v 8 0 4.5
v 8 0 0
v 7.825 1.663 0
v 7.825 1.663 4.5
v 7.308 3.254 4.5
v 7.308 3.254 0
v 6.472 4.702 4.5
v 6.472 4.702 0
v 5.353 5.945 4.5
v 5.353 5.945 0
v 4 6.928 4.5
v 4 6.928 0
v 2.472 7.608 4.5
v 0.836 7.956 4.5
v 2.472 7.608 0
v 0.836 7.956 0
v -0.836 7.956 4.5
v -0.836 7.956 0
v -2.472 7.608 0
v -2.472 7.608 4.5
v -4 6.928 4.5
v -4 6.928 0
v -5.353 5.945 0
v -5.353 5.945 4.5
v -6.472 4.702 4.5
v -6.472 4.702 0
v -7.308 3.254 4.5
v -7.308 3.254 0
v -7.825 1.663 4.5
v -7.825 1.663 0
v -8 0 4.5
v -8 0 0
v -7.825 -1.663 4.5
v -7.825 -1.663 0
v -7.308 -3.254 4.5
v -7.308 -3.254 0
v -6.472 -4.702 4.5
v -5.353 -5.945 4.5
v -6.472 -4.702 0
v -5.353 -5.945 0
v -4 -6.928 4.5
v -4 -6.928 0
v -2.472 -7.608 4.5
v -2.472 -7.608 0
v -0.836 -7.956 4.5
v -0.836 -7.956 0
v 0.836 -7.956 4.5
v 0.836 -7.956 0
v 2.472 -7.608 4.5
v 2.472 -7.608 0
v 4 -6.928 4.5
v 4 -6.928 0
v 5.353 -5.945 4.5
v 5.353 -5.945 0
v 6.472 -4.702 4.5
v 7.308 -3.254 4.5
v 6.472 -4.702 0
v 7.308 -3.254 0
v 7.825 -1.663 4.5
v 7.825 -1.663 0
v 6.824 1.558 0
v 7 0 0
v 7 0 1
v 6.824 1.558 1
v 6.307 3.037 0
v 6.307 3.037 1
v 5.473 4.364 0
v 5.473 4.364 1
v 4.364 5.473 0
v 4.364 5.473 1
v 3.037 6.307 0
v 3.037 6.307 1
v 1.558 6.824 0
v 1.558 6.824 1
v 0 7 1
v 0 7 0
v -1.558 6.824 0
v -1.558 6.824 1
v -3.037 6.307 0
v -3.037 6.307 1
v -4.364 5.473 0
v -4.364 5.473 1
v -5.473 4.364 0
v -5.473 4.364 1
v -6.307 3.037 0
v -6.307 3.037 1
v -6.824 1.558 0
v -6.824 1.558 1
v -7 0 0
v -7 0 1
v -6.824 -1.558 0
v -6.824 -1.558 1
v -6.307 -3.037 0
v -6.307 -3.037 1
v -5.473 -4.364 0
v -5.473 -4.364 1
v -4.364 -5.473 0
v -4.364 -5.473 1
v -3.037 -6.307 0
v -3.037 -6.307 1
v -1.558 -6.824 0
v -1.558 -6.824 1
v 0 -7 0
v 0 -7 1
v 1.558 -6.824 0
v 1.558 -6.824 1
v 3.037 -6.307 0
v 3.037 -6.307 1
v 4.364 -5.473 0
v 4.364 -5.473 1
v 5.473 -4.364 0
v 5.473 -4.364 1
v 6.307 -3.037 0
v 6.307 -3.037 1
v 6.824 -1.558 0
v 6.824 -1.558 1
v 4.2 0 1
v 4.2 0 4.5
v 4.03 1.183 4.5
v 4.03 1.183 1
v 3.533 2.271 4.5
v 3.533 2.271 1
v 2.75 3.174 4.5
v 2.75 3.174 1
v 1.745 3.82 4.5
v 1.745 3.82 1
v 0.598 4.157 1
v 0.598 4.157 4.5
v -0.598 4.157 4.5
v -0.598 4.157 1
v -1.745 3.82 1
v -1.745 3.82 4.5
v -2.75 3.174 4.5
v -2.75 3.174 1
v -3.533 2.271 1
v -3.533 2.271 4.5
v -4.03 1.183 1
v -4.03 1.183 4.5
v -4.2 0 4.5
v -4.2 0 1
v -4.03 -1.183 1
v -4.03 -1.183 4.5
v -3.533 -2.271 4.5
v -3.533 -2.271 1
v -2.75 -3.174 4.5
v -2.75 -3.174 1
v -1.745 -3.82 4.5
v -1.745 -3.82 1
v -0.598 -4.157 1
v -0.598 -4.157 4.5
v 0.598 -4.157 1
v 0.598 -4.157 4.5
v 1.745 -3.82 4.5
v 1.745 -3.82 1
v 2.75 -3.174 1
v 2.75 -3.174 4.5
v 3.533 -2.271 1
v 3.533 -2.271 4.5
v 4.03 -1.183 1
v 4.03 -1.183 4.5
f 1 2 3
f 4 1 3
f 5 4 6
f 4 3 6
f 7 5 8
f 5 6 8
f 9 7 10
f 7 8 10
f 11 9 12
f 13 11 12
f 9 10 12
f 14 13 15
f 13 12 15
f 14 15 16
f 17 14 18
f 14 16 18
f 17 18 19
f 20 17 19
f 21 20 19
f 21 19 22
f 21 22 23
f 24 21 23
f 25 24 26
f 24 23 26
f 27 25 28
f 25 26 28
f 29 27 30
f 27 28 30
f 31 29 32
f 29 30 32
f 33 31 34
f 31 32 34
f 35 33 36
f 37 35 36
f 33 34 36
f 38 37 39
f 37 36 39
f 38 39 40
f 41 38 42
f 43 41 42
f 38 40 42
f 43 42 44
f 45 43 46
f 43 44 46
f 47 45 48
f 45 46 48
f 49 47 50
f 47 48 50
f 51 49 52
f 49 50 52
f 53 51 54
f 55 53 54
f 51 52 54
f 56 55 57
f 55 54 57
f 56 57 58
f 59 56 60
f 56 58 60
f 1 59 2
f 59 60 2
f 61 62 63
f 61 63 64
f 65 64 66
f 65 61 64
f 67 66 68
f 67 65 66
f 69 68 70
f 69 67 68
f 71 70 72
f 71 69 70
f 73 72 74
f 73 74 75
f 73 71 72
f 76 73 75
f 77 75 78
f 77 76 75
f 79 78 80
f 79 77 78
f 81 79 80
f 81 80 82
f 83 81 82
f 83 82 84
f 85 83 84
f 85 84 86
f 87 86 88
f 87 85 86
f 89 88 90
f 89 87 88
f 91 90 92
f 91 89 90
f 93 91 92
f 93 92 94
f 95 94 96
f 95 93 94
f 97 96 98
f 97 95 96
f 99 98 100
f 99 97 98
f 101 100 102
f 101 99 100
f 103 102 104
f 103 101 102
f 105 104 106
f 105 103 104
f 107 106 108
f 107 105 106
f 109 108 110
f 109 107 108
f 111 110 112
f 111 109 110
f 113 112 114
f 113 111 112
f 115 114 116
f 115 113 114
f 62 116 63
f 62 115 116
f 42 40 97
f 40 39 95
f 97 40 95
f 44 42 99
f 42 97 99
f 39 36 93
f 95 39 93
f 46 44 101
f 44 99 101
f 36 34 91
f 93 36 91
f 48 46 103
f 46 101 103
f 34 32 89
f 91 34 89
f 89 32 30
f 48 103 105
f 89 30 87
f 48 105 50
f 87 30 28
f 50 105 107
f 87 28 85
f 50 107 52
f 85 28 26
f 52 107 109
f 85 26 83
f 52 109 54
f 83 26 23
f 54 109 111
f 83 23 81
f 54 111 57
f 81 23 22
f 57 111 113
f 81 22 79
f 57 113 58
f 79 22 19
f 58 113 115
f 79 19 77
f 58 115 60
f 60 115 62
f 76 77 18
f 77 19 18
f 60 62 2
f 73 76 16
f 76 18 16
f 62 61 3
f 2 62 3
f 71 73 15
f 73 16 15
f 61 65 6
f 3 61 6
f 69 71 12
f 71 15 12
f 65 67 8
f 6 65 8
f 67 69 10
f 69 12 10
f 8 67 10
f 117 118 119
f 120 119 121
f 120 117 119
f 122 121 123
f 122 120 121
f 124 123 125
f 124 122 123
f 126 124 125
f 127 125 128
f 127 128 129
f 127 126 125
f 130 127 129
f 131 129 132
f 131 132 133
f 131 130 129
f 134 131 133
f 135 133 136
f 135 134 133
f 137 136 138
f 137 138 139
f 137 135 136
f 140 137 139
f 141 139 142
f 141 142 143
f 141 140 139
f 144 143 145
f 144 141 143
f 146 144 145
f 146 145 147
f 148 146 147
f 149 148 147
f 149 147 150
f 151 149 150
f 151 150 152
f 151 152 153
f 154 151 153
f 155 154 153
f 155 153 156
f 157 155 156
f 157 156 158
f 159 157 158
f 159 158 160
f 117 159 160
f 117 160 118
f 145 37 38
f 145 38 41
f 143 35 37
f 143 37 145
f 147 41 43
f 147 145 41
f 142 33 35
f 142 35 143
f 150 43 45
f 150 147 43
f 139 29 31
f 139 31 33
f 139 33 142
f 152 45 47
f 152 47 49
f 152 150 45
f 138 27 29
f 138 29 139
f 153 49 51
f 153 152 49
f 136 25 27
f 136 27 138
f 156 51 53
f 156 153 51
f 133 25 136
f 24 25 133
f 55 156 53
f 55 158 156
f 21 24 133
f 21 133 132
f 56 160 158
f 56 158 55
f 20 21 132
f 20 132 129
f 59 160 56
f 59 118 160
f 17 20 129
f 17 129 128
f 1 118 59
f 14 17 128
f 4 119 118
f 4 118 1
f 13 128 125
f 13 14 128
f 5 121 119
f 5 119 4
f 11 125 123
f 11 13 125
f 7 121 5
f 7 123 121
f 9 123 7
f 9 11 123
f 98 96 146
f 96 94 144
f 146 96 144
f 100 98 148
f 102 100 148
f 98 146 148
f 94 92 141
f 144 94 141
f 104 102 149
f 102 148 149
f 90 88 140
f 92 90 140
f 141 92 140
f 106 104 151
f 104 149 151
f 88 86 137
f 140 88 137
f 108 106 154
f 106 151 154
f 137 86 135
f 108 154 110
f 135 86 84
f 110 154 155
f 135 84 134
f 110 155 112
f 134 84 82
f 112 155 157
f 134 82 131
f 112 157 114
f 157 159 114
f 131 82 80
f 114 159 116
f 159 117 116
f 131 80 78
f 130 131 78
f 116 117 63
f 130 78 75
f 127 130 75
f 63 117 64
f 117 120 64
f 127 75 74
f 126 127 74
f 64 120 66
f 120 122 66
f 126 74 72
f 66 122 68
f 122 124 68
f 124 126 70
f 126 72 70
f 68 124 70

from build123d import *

# Parameters (mm, degrees)
CYLINDER014005899_R     = 7
CYLINDER014005899_DEPTH = 1
TUBE005_R               = 8
TUBE005_R_2             = 4.2
TUBE005_DEPTH           = 4.5


with BuildPart() as v_lec809:
    # Cylinder014005899 → Cylinder014005899 (new body)
    with BuildSketch(Plane.XY):
        Circle(CYLINDER014005899_R)
    extrude(amount=CYLINDER014005899_DEPTH)


with BuildPart() as ring001:
    # Tube005 → Tube005 (new body)
    with BuildSketch(Plane.XY):
        Circle(TUBE005_R)
        Circle(TUBE005_R_2, mode=Mode.SUBTRACT)
    extrude(amount=TUBE005_DEPTH)

    # Cut009003003009003003003003: cut Válec809
    add(v_lec809.part, mode=Mode.SUBTRACT)


solid = ring001.part
